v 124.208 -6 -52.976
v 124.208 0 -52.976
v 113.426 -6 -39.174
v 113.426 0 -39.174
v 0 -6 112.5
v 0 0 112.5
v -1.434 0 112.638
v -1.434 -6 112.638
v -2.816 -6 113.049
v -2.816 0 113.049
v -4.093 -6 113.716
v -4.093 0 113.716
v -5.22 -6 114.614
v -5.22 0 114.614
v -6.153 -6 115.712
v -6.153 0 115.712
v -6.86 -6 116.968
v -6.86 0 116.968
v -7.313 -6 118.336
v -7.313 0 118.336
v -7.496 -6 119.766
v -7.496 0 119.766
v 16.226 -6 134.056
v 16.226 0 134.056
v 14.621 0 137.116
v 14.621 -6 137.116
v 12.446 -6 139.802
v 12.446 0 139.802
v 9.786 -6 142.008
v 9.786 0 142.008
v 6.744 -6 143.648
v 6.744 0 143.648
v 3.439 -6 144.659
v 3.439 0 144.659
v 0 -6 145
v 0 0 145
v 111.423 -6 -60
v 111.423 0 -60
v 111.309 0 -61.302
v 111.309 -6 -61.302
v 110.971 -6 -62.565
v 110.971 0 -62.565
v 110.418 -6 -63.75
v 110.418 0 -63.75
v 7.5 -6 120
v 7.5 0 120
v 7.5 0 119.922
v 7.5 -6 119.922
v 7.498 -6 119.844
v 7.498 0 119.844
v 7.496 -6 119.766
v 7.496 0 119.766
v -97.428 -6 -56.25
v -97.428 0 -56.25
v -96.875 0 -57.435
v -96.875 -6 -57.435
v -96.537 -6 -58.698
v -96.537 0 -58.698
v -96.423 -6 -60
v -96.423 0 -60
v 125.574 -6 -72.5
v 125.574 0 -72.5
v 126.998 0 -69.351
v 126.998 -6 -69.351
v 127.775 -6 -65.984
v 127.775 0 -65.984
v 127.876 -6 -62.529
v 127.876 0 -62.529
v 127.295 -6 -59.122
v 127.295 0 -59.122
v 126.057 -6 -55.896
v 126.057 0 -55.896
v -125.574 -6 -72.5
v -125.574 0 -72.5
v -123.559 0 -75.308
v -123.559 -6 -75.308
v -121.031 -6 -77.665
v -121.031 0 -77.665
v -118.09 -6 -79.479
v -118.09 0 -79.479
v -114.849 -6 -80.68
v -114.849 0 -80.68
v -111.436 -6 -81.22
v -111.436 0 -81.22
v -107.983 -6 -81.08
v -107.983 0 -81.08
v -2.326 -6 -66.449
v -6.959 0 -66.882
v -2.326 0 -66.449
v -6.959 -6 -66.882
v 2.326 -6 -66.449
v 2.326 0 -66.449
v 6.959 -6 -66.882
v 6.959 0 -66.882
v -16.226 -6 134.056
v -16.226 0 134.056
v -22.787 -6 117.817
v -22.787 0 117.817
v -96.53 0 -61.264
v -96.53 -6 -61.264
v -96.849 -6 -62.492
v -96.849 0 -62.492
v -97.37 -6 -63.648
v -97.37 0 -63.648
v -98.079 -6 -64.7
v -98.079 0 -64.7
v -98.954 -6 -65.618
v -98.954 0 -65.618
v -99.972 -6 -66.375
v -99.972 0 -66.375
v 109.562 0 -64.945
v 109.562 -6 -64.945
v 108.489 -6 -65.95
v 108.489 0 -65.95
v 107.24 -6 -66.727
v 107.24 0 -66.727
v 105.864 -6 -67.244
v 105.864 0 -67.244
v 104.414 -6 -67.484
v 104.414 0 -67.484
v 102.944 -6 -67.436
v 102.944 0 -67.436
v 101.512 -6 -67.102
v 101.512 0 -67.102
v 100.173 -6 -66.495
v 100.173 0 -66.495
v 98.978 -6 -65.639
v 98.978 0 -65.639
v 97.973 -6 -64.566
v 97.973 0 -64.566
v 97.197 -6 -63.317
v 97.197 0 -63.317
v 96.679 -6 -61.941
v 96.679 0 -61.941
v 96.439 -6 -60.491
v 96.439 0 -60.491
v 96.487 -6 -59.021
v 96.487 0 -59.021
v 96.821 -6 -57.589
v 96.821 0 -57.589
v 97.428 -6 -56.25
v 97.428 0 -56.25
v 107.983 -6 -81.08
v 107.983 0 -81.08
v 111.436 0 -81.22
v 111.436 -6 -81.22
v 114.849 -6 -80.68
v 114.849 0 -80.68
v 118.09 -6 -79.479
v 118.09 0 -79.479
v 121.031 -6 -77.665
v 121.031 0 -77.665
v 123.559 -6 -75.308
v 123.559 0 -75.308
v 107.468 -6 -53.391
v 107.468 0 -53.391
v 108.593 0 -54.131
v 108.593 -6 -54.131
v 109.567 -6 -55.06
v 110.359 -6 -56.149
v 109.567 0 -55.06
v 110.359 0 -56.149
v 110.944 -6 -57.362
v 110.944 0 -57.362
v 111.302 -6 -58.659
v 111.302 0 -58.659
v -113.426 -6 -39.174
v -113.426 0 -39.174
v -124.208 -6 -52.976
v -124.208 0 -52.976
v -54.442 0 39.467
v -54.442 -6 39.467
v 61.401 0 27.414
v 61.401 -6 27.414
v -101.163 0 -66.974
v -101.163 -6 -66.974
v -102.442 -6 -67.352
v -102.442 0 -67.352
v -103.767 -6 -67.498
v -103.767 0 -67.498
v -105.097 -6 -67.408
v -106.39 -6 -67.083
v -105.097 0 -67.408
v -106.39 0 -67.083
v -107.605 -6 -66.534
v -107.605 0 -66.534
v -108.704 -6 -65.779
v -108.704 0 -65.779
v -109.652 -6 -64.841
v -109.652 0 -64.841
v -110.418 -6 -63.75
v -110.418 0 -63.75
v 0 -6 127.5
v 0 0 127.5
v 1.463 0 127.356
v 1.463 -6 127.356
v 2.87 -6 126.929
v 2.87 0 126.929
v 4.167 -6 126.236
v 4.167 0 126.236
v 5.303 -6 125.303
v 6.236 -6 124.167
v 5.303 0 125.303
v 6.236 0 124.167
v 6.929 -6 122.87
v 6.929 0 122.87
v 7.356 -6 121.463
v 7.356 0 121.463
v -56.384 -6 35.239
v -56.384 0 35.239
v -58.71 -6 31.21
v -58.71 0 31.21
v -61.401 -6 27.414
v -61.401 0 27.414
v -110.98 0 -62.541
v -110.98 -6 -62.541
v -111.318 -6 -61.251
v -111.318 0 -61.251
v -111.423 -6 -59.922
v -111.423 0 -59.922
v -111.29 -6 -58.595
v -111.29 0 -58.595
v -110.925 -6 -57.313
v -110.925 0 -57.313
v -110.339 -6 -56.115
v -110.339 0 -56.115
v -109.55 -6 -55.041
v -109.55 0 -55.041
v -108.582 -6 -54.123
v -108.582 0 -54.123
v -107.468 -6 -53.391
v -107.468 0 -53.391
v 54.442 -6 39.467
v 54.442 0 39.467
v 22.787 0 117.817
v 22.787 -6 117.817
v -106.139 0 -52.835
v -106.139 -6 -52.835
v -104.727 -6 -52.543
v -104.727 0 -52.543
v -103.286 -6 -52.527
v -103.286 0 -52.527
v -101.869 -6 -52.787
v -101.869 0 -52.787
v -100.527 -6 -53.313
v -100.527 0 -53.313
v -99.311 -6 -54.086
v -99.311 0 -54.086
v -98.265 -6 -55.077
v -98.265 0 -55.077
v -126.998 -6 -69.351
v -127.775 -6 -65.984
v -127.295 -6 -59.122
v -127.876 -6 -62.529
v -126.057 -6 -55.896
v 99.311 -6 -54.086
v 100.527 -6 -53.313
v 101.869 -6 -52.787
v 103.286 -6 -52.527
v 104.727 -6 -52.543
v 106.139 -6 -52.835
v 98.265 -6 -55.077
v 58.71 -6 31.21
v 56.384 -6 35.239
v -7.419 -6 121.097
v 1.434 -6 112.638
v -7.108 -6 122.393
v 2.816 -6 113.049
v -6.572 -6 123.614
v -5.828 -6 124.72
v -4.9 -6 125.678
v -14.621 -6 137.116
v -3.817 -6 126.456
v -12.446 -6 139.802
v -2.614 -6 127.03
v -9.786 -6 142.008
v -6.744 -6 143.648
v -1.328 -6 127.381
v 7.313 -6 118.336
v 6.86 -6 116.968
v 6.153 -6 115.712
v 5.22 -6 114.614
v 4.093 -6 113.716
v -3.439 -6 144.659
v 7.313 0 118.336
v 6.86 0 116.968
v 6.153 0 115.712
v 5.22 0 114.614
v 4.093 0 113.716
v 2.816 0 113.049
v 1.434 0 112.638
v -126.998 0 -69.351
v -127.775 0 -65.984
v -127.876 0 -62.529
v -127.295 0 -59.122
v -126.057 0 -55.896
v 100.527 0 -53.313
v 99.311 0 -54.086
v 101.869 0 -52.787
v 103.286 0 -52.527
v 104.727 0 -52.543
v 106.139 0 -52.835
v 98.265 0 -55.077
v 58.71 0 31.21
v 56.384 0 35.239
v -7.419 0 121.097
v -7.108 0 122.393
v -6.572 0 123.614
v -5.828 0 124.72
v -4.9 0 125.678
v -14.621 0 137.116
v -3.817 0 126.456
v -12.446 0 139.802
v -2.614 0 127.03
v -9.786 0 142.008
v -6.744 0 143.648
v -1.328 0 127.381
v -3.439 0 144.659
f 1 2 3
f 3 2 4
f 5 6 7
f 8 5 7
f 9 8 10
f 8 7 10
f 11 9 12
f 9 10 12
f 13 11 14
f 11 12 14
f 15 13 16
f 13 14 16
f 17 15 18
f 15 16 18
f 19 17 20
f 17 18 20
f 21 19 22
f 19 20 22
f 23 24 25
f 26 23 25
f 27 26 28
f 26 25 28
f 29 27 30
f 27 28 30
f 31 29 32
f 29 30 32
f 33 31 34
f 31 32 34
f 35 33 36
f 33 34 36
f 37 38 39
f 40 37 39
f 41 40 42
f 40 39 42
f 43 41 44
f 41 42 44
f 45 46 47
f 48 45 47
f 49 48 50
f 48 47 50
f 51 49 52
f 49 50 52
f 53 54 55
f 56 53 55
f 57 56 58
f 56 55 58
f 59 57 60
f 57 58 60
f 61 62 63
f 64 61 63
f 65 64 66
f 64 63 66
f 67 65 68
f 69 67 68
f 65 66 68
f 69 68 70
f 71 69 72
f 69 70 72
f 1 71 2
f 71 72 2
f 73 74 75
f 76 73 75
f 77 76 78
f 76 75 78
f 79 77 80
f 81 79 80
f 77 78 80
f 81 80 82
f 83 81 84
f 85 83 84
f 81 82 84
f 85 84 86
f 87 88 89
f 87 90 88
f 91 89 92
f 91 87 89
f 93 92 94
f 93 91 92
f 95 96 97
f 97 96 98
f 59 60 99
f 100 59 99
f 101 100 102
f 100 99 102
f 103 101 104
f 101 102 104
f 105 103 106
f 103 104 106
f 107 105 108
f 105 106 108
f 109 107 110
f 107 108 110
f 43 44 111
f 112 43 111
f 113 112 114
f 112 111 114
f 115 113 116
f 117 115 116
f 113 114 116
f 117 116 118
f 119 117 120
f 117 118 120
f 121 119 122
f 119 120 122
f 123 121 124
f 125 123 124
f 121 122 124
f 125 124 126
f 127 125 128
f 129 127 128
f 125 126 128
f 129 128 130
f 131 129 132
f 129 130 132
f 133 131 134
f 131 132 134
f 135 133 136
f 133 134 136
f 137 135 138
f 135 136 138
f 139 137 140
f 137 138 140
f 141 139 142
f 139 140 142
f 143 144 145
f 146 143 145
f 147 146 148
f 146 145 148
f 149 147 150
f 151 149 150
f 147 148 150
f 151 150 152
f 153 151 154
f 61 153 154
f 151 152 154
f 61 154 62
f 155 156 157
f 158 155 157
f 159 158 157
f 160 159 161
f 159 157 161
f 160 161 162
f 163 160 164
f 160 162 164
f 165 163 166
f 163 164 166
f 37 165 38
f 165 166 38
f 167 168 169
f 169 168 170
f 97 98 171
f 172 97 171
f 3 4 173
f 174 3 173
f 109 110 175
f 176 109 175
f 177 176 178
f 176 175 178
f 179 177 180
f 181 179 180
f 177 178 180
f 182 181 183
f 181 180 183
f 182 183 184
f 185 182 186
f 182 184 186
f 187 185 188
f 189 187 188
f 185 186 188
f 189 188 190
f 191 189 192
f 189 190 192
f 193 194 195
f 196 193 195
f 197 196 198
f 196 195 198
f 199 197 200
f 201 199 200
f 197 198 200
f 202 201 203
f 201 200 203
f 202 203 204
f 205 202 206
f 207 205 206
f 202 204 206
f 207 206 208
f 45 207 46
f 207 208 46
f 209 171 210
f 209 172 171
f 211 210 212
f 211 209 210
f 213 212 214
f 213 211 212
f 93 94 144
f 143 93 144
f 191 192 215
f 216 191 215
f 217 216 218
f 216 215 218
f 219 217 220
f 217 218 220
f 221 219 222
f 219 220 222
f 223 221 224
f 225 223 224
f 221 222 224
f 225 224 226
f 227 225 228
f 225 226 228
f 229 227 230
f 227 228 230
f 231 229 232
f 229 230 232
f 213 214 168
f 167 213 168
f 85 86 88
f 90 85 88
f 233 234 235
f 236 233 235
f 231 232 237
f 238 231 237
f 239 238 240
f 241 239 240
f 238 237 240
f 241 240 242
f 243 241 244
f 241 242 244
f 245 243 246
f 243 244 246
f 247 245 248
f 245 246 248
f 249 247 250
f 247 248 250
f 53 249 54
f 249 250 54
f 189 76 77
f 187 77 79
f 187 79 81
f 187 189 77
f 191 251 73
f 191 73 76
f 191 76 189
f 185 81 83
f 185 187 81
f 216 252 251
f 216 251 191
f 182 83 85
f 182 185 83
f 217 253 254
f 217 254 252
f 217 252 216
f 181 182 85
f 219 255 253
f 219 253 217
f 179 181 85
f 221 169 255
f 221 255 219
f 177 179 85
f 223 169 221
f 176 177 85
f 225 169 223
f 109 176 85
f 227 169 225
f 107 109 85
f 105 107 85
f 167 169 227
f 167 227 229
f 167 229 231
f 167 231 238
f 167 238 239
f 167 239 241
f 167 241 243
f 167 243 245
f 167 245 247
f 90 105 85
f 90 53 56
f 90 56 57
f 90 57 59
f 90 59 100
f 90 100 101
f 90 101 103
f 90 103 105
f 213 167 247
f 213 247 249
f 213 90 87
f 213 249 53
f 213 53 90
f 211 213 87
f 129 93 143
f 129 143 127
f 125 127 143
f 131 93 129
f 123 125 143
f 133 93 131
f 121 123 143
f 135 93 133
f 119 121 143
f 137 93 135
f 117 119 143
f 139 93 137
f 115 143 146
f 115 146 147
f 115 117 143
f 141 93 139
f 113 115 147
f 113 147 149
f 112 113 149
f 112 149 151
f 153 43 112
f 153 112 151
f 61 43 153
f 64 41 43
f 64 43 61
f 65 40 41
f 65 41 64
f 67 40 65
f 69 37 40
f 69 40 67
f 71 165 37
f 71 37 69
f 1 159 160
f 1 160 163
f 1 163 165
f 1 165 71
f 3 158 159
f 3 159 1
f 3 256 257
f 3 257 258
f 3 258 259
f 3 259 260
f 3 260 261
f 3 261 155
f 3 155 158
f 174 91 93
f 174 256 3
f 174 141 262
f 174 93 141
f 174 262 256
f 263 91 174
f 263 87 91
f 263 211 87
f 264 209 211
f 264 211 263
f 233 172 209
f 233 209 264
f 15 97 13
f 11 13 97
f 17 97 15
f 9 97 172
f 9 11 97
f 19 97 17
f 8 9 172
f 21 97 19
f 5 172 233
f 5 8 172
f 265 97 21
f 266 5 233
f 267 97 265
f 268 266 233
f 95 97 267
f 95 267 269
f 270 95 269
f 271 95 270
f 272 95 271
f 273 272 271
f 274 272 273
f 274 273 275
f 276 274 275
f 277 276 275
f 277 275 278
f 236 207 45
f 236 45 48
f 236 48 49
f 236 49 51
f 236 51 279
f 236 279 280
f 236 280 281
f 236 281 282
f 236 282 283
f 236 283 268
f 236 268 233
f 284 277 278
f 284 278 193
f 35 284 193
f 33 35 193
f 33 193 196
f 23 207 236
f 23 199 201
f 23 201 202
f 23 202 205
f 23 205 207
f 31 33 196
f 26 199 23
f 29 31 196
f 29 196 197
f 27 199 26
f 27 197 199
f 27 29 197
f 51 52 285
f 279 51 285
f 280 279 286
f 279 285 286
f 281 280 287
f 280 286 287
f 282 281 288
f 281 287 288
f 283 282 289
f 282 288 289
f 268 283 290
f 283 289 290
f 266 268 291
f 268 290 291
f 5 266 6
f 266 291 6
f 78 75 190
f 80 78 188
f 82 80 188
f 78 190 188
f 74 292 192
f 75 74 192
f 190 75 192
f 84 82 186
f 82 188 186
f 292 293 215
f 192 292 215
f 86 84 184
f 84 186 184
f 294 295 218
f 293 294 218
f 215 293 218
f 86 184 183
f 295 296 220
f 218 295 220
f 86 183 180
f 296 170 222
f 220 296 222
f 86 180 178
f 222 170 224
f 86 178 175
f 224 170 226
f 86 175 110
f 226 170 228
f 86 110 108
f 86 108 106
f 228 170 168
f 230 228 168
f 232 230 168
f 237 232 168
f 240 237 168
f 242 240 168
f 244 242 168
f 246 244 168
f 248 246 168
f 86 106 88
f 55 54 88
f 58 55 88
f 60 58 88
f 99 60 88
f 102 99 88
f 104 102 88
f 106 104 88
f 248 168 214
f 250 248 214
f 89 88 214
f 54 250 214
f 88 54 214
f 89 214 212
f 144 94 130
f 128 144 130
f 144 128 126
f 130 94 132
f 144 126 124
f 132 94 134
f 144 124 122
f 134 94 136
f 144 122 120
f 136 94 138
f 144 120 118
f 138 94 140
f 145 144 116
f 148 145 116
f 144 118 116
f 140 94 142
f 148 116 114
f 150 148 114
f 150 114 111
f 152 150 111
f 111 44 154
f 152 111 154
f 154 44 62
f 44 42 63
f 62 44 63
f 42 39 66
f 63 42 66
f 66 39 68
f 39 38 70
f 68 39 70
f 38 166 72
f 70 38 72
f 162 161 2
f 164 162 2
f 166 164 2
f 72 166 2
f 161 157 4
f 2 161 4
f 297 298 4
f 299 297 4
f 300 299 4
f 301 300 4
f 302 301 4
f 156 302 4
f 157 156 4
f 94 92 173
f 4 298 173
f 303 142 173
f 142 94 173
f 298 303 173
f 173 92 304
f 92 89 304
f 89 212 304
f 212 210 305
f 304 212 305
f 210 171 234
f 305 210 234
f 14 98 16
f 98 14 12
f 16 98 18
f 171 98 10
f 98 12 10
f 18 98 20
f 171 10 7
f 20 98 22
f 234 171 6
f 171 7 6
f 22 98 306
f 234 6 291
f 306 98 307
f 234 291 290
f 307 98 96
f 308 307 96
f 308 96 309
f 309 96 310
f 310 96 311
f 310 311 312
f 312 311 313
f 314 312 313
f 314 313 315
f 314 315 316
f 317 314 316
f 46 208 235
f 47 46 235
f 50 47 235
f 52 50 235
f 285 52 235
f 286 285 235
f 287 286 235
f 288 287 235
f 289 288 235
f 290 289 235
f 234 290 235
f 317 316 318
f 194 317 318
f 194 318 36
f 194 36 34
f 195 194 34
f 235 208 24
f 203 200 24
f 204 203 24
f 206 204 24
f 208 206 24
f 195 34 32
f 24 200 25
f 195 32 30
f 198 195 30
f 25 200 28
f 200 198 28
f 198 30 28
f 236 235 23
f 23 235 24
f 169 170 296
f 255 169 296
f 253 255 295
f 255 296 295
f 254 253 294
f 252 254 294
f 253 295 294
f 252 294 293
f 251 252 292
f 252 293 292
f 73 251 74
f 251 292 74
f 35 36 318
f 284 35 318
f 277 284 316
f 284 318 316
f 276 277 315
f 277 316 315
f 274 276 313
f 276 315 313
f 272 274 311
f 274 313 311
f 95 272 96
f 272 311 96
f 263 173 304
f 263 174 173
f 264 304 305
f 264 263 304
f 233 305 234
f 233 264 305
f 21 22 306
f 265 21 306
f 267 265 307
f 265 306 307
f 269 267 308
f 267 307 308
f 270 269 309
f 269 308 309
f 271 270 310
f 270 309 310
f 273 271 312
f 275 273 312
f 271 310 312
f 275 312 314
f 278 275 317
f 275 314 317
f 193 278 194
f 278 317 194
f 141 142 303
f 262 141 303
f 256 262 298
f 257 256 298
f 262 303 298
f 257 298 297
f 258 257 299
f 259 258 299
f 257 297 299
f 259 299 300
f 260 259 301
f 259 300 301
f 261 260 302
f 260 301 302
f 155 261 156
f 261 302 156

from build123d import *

# Parameters (mm, degrees)
F1_DEPTH = 6
F2_R     = 50
F3_R     = 50
F4_R     = 50


with BuildPart() as f1:
    # F0 (on Front) → F1 (new body)
    with BuildSketch(Plane.XZ):
        with BuildLine():
            ThreePointArc((107.4682422482, -53.390794226), (110.6754015758, -46.378394604), (113.4255666495, -39.1744920866))
            Line((113.4255666495, -39.1744920866), (57.0742879696, 32.9518555231))
            Line((57.0742879696, 32.9518555231), (0, 0))
            Line((0, 0), (97.4278579257, -56.25))
            ThreePointArc((97.4278579257, -56.25), (101.8689343878, -52.7867749652), (107.4682422482, -53.390794226))
        make_face()
        with BuildLine():
            Line((110.4182389825, -63.75), (125.5736835487, -72.5))
            ThreePointArc((125.5736835487, -72.5), (127.8756098621, -62.5292617095), (124.2084271706, -52.9759241818))
            Line((124.2084271706, -52.9759241818), (113.4255666495, -39.1744920866))
            ThreePointArc((113.4255666495, -39.1744920866), (110.6754015758, -46.378394604), (107.4682422482, -53.390794226))
            ThreePointArc((107.4682422482, -53.390794226), (110.3588449649, -56.1489581575), (111.4230484541, -60))
            ThreePointArc((111.4230484541, -60), (111.1674921513, -61.9411428383), (110.4182389825, -63.75))
        make_face()
        with BuildLine():
            ThreePointArc((90.6388886521, -78.6421761138), (95.5025687017, -72.6585120367), (99.9719052521, -66.374830774))
            ThreePointArc((99.9719052521, -66.374830774), (96.6491552976, -61.8276975537), (97.4278579257, -56.25))
            Line((97.4278579257, -56.25), (0, 0))
            Line((0, 0), (0, -65.9037110461))
            Line((0, -65.9037110461), (90.6388886521, -78.6421761138))
        make_face()
        with BuildLine():
            Line((-90.6388886521, -78.6421761138), (0, -65.9037110461))
            Line((0, -65.9037110461), (0, 0))
            Line((0, 0), (-97.4278579257, -56.25))
            ThreePointArc((-97.4278579257, -56.25), (-96.678604757, -58.0588571617), (-96.4230484541, -60))
            ThreePointArc((-96.4230484541, -60), (-97.3700501322, -63.6480423507), (-99.9719052521, -66.374830774))
            ThreePointArc((-99.9719052521, -66.374830774), (-95.5025687017, -72.6585120367), (-90.6388886521, -78.6421761138))
        make_face()
        with BuildLine():
            Line((0, 0), (-57.0742879696, 32.9518555231))
            Line((-57.0742879696, 32.9518555231), (-113.4255666495, -39.1744920866))
            ThreePointArc((-113.4255666495, -39.1744920866), (-110.6754015758, -46.378394604), (-107.4682422482, -53.390794226))
            ThreePointArc((-107.4682422482, -53.390794226), (-101.8689343878, -52.7867749652), (-97.4278579257, -56.25))
            Line((-97.4278579257, -56.25), (0, 0))
        make_face()
        with BuildLine():
            ThreePointArc((-124.2084271706, -52.9759241818), (-127.8756098621, -62.5292617095), (-125.5736835487, -72.5))
            Line((-125.5736835487, -72.5), (-110.4182389825, -63.75))
            ThreePointArc((-110.4182389825, -63.75), (-111.1362734889, -57.9458859336), (-107.4682422482, -53.390794226))
            ThreePointArc((-107.4682422482, -53.390794226), (-110.6754015758, -46.378394604), (-113.4255666495, -39.1744920866))
            Line((-113.4255666495, -39.1744920866), (-124.2084271706, -52.9759241818))
        make_face()
        with BuildLine():
            Line((-110.4182389825, -63.75), (-125.5736835487, -72.5))
            ThreePointArc((-125.5736835487, -72.5), (-118.0897340513, -79.4788958102), (-107.9827097157, -81.079691203))
            Line((-107.9827097157, -81.079691203), (-90.6388886521, -78.6421761138))
            ThreePointArc((-90.6388886521, -78.6421761138), (-95.5025687017, -72.6585120367), (-99.9719052521, -66.374830774))
            ThreePointArc((-99.9719052521, -66.374830774), (-105.7507460078, -67.2738931565), (-110.4182389825, -63.75))
        make_face()
        with BuildLine():
            ThreePointArc((0, 112.5), (-5.2197790902, 114.6144725189), (-7.4963369961, 119.765625))
            ThreePointArc((-7.4963369961, 119.765625), (-15.1728328741, 119.0369066406), (-22.7866779974, 117.8166682004))
            Line((-22.7866779974, 117.8166682004), (-57.0742879696, 32.9518555231))
            Line((-57.0742879696, 32.9518555231), (0, 0))
            Line((0, 0), (0, 112.5))
        make_face()
        with BuildLine():
            Line((0, 127.5), (0, 145))
            ThreePointArc((0, 145), (-9.7858758107, 142.0081575197), (-16.2257174549, 134.0556153848))
            Line((-16.2257174549, 134.0556153848), (-22.7866779974, 117.8166682004))
            ThreePointArc((-22.7866779974, 117.8166682004), (-15.1728328741, 119.0369066406), (-7.4963369961, 119.765625))
            ThreePointArc((-7.4963369961, 119.765625), (-5.3855274811, 125.2197790902), (0, 127.5))
        make_face()
        with BuildLine():
            ThreePointArc((16.2257174549, 134.0556153848), (9.7858758107, 142.0081575197), (0, 145))
            Line((0, 145), (0, 127.5))
            ThreePointArc((0, 127.5), (5.3033008589, 125.3033008589), (7.5, 120))
            ThreePointArc((7.5, 120), (7.4990841931, 119.8827981888), (7.4963369961, 119.765625))
            ThreePointArc((7.4963369961, 119.765625), (15.1728328741, 119.0369066406), (22.7866779974, 117.8166682004))
            Line((22.7866779974, 117.8166682004), (16.2257174549, 134.0556153848))
        make_face()
        with BuildLine():
            ThreePointArc((107.9827097157, -81.079691203), (118.0897340513, -79.4788958102), (125.5736835487, -72.5))
            Line((125.5736835487, -72.5), (110.4182389825, -63.75))
            ThreePointArc((110.4182389825, -63.75), (105.7507460078, -67.2738931565), (99.9719052521, -66.374830774))
            ThreePointArc((99.9719052521, -66.374830774), (95.5025687017, -72.6585120367), (90.6388886521, -78.6421761138))
            Line((90.6388886521, -78.6421761138), (107.9827097157, -81.079691203))
        make_face()
        with BuildLine():
            Line((57.0742879696, 32.9518555231), (22.7866779974, 117.8166682004))
            ThreePointArc((22.7866779974, 117.8166682004), (15.1728328741, 119.0369066406), (7.4963369961, 119.765625))
            ThreePointArc((7.4963369961, 119.765625), (5.2197790902, 114.6144725189), (0, 112.5))
            Line((0, 112.5), (0, 0))
            Line((0, 0), (57.0742879696, 32.9518555231))
        make_face()
    extrude(amount=F1_DEPTH)

    # F2
    f2_edges = [f1.edges().sort_by_distance(p)[0] for p in [
        (-57.074288, -3, 32.951856),
    ]]
    fillet(f2_edges, radius=F2_R)

    # F3
    f3_edges = [f1.edges().sort_by_distance(p)[0] for p in [
        (0, -3, -65.903711),
    ]]
    fillet(f3_edges, radius=F3_R)

    # F4
    f4_edges = [f1.edges().sort_by_distance(p)[0] for p in [
        (57.074288, -3, 32.951856),
    ]]
    fillet(f4_edges, radius=F4_R)


solid = f1.part
